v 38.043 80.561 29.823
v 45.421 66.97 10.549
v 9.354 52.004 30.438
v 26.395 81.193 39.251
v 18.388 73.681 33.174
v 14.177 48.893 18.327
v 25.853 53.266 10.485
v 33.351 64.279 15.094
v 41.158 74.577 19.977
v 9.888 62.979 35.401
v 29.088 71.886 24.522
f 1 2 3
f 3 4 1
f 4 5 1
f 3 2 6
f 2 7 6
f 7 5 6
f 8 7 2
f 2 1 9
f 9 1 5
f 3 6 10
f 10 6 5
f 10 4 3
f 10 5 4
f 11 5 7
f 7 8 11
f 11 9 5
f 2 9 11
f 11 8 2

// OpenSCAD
// Auto-generated auxetic polyhedron
points = [
    [9.354020, 52.003844, 30.438275],
    [45.421230, 66.970320, 10.549018],
    [38.042934, 80.560622, 29.822539],
    [26.394589, 81.193010, 39.251280],
    [18.388277, 73.680767, 33.173537],
    [14.177168, 48.892825, 18.326762],
    [25.852521, 53.265772, 10.484694],
    [33.351141, 64.278976, 15.094102],
    [41.157878, 74.576973, 19.977366],
    [9.887683, 62.978571, 35.400940],
    [29.087790, 71.885629, 24.522450],
];

faces = [
    [0, 1, 2],
    [2, 3, 0],
    [2, 4, 3],
    [5, 1, 0],
    [5, 6, 1],
    [5, 4, 6],
    [1, 6, 7],
    [8, 2, 1],
    [4, 2, 8],
    [9, 5, 0],
    [4, 5, 9],
    [0, 3, 9],
    [3, 4, 9],
    [6, 4, 10],
    [10, 7, 6],
    [4, 8, 10],
    [10, 8, 1],
    [1, 7, 10],
];

polyhedron(points = points, faces = faces);
